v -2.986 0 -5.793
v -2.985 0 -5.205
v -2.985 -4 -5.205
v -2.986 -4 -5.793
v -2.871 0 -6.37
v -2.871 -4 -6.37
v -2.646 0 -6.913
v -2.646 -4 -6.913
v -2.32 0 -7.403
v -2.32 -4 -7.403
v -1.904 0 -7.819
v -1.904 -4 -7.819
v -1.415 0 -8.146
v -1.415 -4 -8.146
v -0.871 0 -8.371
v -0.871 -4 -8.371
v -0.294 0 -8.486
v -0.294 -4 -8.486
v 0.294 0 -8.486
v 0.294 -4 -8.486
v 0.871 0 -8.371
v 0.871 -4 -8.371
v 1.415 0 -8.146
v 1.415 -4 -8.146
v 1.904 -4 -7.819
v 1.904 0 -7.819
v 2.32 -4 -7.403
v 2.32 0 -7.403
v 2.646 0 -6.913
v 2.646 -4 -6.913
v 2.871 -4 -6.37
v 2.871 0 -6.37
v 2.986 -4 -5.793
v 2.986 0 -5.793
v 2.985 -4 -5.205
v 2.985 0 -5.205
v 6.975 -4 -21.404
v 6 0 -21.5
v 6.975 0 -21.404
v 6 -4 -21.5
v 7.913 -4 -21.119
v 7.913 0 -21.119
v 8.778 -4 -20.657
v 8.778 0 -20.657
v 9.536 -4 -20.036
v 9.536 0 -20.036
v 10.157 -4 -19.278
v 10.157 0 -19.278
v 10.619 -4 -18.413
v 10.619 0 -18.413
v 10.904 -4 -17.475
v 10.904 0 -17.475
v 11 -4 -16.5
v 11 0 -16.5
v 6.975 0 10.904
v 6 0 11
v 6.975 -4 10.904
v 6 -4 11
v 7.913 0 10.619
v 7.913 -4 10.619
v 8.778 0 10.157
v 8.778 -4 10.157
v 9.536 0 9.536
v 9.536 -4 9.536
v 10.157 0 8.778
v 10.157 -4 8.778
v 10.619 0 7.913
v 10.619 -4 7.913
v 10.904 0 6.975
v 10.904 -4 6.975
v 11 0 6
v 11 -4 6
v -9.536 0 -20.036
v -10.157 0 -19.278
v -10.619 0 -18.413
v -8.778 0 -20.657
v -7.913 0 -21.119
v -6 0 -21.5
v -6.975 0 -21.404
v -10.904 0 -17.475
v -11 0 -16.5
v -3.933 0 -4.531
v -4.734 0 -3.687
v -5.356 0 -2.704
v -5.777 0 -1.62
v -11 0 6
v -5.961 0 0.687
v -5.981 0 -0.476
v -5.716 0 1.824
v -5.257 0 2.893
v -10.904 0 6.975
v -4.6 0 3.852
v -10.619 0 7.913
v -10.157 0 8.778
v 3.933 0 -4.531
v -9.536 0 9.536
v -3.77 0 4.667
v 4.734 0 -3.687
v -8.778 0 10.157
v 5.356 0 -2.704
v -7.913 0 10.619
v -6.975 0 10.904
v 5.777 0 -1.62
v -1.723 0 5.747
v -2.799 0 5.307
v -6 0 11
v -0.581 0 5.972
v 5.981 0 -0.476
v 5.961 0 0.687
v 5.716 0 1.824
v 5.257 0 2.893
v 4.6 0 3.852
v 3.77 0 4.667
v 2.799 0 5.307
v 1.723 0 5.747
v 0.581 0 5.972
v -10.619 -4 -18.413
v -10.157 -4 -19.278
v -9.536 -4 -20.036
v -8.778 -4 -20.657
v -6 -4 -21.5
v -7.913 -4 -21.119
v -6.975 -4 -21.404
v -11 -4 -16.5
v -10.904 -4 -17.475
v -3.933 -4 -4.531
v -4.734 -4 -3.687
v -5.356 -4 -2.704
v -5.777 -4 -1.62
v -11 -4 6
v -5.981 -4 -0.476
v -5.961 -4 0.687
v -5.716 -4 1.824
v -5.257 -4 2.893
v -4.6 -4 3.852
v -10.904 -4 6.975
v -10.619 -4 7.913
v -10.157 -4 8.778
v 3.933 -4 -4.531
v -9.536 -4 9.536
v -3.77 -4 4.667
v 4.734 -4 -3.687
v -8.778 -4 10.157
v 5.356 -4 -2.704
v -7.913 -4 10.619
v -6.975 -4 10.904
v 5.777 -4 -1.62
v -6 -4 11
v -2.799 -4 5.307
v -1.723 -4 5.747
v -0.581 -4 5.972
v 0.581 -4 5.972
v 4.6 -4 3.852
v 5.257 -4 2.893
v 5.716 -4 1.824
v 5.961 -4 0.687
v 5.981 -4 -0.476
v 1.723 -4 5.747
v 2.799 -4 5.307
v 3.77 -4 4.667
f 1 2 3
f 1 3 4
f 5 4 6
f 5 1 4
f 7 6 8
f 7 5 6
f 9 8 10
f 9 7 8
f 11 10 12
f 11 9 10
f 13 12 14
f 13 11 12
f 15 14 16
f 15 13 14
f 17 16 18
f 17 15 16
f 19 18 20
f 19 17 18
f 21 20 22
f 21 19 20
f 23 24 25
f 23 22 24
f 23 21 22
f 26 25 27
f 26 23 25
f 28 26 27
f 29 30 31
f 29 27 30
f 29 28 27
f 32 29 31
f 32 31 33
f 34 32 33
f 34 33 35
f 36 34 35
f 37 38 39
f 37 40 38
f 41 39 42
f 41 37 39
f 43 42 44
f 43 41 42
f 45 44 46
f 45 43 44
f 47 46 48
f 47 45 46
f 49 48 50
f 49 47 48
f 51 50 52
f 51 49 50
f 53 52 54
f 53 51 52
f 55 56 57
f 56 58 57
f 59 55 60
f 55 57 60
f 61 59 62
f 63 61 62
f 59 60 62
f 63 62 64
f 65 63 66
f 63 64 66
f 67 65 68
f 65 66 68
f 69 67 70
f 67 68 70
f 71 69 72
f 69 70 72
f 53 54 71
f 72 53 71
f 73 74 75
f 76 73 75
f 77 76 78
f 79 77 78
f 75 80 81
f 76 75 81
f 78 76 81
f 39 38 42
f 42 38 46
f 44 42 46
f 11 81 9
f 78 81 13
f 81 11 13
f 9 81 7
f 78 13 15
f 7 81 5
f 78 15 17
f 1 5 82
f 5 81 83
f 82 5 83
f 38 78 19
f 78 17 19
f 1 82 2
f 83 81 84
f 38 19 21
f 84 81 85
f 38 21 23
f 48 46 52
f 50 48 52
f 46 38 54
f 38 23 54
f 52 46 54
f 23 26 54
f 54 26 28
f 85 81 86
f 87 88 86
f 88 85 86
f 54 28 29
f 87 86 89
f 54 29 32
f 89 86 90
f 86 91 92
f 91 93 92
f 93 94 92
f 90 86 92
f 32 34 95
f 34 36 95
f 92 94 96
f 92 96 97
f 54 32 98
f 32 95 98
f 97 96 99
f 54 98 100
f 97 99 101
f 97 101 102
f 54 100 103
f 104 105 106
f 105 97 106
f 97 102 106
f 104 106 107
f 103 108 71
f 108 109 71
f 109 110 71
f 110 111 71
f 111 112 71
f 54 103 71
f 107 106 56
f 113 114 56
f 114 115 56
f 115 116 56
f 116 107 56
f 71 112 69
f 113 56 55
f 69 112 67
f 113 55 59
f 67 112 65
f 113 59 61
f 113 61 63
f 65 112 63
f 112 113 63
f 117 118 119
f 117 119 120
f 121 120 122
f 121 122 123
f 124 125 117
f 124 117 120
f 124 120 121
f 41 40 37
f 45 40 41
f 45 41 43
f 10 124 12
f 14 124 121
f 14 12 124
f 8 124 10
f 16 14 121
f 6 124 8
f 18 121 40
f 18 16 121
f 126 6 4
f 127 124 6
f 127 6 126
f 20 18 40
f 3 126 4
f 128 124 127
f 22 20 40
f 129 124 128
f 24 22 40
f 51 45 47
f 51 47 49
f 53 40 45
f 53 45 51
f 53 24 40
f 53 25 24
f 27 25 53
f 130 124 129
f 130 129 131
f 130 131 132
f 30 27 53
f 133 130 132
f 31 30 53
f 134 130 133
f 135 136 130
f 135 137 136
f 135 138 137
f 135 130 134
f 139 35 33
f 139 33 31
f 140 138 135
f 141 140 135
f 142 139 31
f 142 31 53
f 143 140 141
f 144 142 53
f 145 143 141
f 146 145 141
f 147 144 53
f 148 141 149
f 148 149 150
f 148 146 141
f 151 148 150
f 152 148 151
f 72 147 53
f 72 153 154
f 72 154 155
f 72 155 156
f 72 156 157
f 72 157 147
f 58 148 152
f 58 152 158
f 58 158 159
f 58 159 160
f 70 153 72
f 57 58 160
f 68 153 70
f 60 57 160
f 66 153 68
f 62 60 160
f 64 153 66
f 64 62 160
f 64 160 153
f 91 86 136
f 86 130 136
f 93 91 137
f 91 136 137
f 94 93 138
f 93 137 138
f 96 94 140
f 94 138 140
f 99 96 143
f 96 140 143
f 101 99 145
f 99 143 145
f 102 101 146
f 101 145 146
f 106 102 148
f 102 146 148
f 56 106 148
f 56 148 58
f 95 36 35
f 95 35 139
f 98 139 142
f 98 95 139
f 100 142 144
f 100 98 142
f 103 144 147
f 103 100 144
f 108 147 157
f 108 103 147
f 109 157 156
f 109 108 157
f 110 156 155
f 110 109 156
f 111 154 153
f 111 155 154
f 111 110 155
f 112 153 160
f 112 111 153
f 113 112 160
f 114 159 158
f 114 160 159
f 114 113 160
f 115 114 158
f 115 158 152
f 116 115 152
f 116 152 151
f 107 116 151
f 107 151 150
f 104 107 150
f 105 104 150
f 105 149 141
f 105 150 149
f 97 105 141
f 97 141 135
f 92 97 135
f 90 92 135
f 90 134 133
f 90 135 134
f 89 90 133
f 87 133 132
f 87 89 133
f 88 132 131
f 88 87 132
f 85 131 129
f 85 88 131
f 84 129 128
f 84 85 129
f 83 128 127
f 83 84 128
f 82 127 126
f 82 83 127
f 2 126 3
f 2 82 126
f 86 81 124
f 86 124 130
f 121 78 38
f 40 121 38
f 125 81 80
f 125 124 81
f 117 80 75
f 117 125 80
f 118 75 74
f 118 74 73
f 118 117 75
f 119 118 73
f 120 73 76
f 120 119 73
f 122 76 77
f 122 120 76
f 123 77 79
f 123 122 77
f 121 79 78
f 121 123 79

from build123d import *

# Parameters (mm, degrees)
F1_W     = 22
F1_H     = 32.5
F2_DEPTH = 4
F3_DEPTH = 4.001
F4_R     = 5


with BuildPart() as f2:
    # F1 (on Front) → F2 (new body)
    with BuildSketch(Plane.XZ):
        with Locations((0, -5.25)):
            Rectangle(F1_W, F1_H)
    extrude(amount=F2_DEPTH)

    # F0 (on Front) → F3 (cut, through all)
    with BuildSketch(Plane.XZ):
        with BuildLine():
            ThreePointArc((-2.985416, -5.204545), (0, -8.5), (2.985416, -5.204545))
            ThreePointArc((2.985416, -5.204545), (0, 6), (-2.985416, -5.204545))
        make_face()
    extrude(amount=F3_DEPTH, mode=Mode.SUBTRACT)

    # F4
    f4_edges = [f2.edges().sort_by_distance(p)[0] for p in [
        (11, -2, 11),
        (-11, -2, 11),
        (-11, -2, -21.5),
        (11, -2, -21.5),
    ]]
    fillet(f4_edges, radius=F4_R)


solid = f2.part
